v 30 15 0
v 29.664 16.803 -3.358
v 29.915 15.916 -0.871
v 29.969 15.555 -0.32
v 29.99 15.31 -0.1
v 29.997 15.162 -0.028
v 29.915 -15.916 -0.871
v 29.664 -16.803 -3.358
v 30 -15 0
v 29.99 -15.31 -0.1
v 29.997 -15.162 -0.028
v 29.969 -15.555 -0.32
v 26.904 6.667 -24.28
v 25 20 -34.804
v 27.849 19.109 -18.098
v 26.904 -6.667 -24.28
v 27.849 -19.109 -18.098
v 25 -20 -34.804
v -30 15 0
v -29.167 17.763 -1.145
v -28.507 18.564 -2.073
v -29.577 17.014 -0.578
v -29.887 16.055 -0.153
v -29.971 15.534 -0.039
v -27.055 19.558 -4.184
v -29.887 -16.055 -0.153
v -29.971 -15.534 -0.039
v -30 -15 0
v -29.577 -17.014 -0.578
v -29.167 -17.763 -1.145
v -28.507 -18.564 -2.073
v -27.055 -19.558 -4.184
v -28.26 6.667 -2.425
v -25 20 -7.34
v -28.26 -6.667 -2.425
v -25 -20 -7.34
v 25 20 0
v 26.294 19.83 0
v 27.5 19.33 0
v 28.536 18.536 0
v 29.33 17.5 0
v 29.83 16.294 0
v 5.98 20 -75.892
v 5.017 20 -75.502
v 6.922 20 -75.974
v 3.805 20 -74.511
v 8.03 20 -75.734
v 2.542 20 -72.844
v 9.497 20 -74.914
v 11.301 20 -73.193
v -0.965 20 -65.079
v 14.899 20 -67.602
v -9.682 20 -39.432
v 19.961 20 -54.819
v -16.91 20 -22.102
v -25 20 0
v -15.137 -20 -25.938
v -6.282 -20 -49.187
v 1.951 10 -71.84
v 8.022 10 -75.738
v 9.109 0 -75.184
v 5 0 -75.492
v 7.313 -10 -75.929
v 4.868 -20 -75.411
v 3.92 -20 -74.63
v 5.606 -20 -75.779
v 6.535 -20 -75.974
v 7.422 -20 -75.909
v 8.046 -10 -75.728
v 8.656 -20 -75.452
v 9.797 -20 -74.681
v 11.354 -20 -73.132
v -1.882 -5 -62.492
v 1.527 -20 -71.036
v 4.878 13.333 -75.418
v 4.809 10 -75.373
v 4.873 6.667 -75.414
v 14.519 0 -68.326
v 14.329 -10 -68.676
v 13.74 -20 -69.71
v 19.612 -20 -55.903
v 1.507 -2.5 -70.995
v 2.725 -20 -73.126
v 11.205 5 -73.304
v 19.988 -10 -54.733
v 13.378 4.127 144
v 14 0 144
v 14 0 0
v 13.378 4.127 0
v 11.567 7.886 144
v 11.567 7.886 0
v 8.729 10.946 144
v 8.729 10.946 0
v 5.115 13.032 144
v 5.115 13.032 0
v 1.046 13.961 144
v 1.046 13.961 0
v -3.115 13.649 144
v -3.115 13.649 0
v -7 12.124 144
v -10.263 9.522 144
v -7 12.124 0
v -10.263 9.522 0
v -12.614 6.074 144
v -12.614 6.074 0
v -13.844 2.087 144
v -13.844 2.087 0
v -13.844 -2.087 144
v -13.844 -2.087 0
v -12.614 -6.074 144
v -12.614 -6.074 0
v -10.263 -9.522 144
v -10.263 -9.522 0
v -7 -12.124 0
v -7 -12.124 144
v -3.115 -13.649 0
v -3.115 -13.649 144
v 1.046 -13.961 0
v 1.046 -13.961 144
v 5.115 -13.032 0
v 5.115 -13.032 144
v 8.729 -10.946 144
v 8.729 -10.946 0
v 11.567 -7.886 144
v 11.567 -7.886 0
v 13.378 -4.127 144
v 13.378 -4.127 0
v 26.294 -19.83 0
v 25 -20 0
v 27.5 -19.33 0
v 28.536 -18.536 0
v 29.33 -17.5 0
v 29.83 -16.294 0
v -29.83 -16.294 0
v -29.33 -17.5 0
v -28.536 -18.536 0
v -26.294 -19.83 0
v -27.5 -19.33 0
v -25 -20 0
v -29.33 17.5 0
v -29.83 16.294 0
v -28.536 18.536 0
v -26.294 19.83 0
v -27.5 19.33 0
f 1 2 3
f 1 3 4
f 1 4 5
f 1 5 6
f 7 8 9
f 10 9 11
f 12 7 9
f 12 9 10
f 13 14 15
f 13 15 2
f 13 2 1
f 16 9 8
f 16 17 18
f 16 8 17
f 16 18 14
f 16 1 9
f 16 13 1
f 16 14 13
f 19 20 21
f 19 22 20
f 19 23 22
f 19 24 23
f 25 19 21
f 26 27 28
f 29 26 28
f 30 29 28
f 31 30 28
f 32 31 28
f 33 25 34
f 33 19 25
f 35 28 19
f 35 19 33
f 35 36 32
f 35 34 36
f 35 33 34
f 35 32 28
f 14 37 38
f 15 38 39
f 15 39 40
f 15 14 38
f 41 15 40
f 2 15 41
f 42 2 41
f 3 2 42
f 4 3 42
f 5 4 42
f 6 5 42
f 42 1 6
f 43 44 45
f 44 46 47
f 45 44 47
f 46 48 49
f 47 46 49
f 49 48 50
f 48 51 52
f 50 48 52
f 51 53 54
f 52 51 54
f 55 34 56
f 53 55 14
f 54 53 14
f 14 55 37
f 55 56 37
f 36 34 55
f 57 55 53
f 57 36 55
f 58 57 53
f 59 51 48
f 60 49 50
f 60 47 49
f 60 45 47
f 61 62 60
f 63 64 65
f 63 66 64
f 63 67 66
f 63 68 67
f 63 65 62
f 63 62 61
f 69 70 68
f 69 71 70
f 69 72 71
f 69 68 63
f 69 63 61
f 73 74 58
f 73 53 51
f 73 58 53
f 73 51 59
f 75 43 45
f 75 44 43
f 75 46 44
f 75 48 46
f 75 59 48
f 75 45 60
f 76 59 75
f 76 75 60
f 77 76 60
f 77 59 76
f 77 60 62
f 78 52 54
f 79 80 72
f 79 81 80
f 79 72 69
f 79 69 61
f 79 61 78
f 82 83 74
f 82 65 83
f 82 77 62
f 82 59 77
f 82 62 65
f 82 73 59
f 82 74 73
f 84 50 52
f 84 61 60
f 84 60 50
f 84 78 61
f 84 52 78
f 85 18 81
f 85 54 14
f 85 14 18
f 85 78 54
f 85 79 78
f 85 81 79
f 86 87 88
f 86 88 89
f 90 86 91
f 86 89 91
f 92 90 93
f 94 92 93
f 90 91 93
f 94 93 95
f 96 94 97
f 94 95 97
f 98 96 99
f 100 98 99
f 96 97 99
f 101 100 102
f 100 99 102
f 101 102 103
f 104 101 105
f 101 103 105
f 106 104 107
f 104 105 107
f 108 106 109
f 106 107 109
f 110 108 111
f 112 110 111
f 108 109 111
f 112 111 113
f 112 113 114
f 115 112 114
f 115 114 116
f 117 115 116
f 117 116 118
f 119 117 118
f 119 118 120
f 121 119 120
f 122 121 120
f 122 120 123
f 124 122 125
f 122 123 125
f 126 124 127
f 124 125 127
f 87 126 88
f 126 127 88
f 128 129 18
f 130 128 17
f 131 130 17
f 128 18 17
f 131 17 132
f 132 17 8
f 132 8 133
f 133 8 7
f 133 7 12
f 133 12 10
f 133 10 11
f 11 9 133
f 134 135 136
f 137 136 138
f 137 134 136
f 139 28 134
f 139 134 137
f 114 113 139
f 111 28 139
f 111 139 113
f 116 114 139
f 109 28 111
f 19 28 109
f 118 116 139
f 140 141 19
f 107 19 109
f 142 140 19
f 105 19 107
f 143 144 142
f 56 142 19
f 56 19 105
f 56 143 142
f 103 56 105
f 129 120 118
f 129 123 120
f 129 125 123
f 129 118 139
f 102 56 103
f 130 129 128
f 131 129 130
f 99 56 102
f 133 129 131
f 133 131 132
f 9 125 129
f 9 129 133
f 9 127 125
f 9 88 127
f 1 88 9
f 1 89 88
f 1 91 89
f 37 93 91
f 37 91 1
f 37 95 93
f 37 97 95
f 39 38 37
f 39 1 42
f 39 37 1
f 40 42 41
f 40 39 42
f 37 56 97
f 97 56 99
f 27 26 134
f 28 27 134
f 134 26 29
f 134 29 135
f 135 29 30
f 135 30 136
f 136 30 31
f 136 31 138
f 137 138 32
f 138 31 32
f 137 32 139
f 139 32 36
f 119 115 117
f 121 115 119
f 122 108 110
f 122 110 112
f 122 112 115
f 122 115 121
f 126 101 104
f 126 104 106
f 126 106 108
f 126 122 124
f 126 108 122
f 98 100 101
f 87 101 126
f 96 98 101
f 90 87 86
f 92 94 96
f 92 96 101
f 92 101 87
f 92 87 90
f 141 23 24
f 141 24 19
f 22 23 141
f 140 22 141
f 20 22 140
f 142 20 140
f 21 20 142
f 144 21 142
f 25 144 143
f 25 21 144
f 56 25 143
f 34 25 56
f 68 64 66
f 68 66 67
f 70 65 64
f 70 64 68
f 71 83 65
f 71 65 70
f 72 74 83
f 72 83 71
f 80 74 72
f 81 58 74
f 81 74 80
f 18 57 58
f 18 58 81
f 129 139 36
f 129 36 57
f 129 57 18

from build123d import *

# Parameters (mm, degrees)
F0_R     = 14
F1_DEPTH = 144
F2_W     = 60
F2_H     = 40
F3_DEPTH = 80
F4_R     = 5
F6_DEPTH = 80


with BuildPart() as f1:
    # F0 (on Top) → F1 (new body)
    with BuildSketch(Plane.XY):
        Circle(F0_R)
    extrude(amount=F1_DEPTH)

    # F2 (on Top) → F3 (join)
    with BuildSketch(Plane.XY):
        Rectangle(F2_W, F2_H)
    extrude(amount=-F3_DEPTH)

    # F4
    f4_edges = [f1.edges().sort_by_distance(p)[0] for p in [
        (-30, -20, -40),
        (-30, 20, -40),
        (30, -20, -40),
        (30, 20, -40),
    ]]
    fillet(f4_edges, radius=F4_R)

    # F5 (on face) → F6 (cut)
    with BuildSketch(Plane.XZ.offset(20)):
        with BuildLine():
            add(Edge.make_bspline(
                [(-25, -7.340222688), (-5.9667022268, -37.5563815562), (0.3915651661, -97.6586740831), (19.1088343549, -64.1343636696), (25, -34.8043713491)],
                knots=[0.0382881592, 0.0382881592, 0.0382881592, 0.0382881592, 0.5056648306, 0.8745963151, 0.8745963151, 0.8745963151, 0.8745963151], degree=3))
            Line((-25, -7.340222688), (-25, -80))
            Line((-25, -80), (25, -80))
            Line((25, -80), (25, -34.8043713491))
        make_face()
        with BuildLine():
            add(Edge.make_bspline(
                [(-30, 0), (-28.2223571299, -2.4121543531), (-26.5592347237, -4.8648721374), (-25, -7.340222688)],
                knots=[0, 0, 0, 0, 0.0382881592, 0.0382881592, 0.0382881592, 0.0382881592], degree=3))
            Line((-30, 0), (-30, -90))
            Line((-30, -90), (30, -90))
            Line((30, -90), (30, 0))
            add(Edge.make_bspline(
                [(25, -34.8043713491), (27.0024690524, -24.8347990321), (28.7315925241, -13.1851745619), (30, 0)],
                knots=[0.8745963151, 0.8745963151, 0.8745963151, 0.8745963151, 1, 1, 1, 1], degree=3))
            Line((25, -34.8043713491), (25, -80))
            Line((25, -80), (-25, -80))
            Line((-25, -80), (-25, -7.340222688))
        make_face()
    extrude(amount=-F6_DEPTH, mode=Mode.SUBTRACT)


solid = f1.part
